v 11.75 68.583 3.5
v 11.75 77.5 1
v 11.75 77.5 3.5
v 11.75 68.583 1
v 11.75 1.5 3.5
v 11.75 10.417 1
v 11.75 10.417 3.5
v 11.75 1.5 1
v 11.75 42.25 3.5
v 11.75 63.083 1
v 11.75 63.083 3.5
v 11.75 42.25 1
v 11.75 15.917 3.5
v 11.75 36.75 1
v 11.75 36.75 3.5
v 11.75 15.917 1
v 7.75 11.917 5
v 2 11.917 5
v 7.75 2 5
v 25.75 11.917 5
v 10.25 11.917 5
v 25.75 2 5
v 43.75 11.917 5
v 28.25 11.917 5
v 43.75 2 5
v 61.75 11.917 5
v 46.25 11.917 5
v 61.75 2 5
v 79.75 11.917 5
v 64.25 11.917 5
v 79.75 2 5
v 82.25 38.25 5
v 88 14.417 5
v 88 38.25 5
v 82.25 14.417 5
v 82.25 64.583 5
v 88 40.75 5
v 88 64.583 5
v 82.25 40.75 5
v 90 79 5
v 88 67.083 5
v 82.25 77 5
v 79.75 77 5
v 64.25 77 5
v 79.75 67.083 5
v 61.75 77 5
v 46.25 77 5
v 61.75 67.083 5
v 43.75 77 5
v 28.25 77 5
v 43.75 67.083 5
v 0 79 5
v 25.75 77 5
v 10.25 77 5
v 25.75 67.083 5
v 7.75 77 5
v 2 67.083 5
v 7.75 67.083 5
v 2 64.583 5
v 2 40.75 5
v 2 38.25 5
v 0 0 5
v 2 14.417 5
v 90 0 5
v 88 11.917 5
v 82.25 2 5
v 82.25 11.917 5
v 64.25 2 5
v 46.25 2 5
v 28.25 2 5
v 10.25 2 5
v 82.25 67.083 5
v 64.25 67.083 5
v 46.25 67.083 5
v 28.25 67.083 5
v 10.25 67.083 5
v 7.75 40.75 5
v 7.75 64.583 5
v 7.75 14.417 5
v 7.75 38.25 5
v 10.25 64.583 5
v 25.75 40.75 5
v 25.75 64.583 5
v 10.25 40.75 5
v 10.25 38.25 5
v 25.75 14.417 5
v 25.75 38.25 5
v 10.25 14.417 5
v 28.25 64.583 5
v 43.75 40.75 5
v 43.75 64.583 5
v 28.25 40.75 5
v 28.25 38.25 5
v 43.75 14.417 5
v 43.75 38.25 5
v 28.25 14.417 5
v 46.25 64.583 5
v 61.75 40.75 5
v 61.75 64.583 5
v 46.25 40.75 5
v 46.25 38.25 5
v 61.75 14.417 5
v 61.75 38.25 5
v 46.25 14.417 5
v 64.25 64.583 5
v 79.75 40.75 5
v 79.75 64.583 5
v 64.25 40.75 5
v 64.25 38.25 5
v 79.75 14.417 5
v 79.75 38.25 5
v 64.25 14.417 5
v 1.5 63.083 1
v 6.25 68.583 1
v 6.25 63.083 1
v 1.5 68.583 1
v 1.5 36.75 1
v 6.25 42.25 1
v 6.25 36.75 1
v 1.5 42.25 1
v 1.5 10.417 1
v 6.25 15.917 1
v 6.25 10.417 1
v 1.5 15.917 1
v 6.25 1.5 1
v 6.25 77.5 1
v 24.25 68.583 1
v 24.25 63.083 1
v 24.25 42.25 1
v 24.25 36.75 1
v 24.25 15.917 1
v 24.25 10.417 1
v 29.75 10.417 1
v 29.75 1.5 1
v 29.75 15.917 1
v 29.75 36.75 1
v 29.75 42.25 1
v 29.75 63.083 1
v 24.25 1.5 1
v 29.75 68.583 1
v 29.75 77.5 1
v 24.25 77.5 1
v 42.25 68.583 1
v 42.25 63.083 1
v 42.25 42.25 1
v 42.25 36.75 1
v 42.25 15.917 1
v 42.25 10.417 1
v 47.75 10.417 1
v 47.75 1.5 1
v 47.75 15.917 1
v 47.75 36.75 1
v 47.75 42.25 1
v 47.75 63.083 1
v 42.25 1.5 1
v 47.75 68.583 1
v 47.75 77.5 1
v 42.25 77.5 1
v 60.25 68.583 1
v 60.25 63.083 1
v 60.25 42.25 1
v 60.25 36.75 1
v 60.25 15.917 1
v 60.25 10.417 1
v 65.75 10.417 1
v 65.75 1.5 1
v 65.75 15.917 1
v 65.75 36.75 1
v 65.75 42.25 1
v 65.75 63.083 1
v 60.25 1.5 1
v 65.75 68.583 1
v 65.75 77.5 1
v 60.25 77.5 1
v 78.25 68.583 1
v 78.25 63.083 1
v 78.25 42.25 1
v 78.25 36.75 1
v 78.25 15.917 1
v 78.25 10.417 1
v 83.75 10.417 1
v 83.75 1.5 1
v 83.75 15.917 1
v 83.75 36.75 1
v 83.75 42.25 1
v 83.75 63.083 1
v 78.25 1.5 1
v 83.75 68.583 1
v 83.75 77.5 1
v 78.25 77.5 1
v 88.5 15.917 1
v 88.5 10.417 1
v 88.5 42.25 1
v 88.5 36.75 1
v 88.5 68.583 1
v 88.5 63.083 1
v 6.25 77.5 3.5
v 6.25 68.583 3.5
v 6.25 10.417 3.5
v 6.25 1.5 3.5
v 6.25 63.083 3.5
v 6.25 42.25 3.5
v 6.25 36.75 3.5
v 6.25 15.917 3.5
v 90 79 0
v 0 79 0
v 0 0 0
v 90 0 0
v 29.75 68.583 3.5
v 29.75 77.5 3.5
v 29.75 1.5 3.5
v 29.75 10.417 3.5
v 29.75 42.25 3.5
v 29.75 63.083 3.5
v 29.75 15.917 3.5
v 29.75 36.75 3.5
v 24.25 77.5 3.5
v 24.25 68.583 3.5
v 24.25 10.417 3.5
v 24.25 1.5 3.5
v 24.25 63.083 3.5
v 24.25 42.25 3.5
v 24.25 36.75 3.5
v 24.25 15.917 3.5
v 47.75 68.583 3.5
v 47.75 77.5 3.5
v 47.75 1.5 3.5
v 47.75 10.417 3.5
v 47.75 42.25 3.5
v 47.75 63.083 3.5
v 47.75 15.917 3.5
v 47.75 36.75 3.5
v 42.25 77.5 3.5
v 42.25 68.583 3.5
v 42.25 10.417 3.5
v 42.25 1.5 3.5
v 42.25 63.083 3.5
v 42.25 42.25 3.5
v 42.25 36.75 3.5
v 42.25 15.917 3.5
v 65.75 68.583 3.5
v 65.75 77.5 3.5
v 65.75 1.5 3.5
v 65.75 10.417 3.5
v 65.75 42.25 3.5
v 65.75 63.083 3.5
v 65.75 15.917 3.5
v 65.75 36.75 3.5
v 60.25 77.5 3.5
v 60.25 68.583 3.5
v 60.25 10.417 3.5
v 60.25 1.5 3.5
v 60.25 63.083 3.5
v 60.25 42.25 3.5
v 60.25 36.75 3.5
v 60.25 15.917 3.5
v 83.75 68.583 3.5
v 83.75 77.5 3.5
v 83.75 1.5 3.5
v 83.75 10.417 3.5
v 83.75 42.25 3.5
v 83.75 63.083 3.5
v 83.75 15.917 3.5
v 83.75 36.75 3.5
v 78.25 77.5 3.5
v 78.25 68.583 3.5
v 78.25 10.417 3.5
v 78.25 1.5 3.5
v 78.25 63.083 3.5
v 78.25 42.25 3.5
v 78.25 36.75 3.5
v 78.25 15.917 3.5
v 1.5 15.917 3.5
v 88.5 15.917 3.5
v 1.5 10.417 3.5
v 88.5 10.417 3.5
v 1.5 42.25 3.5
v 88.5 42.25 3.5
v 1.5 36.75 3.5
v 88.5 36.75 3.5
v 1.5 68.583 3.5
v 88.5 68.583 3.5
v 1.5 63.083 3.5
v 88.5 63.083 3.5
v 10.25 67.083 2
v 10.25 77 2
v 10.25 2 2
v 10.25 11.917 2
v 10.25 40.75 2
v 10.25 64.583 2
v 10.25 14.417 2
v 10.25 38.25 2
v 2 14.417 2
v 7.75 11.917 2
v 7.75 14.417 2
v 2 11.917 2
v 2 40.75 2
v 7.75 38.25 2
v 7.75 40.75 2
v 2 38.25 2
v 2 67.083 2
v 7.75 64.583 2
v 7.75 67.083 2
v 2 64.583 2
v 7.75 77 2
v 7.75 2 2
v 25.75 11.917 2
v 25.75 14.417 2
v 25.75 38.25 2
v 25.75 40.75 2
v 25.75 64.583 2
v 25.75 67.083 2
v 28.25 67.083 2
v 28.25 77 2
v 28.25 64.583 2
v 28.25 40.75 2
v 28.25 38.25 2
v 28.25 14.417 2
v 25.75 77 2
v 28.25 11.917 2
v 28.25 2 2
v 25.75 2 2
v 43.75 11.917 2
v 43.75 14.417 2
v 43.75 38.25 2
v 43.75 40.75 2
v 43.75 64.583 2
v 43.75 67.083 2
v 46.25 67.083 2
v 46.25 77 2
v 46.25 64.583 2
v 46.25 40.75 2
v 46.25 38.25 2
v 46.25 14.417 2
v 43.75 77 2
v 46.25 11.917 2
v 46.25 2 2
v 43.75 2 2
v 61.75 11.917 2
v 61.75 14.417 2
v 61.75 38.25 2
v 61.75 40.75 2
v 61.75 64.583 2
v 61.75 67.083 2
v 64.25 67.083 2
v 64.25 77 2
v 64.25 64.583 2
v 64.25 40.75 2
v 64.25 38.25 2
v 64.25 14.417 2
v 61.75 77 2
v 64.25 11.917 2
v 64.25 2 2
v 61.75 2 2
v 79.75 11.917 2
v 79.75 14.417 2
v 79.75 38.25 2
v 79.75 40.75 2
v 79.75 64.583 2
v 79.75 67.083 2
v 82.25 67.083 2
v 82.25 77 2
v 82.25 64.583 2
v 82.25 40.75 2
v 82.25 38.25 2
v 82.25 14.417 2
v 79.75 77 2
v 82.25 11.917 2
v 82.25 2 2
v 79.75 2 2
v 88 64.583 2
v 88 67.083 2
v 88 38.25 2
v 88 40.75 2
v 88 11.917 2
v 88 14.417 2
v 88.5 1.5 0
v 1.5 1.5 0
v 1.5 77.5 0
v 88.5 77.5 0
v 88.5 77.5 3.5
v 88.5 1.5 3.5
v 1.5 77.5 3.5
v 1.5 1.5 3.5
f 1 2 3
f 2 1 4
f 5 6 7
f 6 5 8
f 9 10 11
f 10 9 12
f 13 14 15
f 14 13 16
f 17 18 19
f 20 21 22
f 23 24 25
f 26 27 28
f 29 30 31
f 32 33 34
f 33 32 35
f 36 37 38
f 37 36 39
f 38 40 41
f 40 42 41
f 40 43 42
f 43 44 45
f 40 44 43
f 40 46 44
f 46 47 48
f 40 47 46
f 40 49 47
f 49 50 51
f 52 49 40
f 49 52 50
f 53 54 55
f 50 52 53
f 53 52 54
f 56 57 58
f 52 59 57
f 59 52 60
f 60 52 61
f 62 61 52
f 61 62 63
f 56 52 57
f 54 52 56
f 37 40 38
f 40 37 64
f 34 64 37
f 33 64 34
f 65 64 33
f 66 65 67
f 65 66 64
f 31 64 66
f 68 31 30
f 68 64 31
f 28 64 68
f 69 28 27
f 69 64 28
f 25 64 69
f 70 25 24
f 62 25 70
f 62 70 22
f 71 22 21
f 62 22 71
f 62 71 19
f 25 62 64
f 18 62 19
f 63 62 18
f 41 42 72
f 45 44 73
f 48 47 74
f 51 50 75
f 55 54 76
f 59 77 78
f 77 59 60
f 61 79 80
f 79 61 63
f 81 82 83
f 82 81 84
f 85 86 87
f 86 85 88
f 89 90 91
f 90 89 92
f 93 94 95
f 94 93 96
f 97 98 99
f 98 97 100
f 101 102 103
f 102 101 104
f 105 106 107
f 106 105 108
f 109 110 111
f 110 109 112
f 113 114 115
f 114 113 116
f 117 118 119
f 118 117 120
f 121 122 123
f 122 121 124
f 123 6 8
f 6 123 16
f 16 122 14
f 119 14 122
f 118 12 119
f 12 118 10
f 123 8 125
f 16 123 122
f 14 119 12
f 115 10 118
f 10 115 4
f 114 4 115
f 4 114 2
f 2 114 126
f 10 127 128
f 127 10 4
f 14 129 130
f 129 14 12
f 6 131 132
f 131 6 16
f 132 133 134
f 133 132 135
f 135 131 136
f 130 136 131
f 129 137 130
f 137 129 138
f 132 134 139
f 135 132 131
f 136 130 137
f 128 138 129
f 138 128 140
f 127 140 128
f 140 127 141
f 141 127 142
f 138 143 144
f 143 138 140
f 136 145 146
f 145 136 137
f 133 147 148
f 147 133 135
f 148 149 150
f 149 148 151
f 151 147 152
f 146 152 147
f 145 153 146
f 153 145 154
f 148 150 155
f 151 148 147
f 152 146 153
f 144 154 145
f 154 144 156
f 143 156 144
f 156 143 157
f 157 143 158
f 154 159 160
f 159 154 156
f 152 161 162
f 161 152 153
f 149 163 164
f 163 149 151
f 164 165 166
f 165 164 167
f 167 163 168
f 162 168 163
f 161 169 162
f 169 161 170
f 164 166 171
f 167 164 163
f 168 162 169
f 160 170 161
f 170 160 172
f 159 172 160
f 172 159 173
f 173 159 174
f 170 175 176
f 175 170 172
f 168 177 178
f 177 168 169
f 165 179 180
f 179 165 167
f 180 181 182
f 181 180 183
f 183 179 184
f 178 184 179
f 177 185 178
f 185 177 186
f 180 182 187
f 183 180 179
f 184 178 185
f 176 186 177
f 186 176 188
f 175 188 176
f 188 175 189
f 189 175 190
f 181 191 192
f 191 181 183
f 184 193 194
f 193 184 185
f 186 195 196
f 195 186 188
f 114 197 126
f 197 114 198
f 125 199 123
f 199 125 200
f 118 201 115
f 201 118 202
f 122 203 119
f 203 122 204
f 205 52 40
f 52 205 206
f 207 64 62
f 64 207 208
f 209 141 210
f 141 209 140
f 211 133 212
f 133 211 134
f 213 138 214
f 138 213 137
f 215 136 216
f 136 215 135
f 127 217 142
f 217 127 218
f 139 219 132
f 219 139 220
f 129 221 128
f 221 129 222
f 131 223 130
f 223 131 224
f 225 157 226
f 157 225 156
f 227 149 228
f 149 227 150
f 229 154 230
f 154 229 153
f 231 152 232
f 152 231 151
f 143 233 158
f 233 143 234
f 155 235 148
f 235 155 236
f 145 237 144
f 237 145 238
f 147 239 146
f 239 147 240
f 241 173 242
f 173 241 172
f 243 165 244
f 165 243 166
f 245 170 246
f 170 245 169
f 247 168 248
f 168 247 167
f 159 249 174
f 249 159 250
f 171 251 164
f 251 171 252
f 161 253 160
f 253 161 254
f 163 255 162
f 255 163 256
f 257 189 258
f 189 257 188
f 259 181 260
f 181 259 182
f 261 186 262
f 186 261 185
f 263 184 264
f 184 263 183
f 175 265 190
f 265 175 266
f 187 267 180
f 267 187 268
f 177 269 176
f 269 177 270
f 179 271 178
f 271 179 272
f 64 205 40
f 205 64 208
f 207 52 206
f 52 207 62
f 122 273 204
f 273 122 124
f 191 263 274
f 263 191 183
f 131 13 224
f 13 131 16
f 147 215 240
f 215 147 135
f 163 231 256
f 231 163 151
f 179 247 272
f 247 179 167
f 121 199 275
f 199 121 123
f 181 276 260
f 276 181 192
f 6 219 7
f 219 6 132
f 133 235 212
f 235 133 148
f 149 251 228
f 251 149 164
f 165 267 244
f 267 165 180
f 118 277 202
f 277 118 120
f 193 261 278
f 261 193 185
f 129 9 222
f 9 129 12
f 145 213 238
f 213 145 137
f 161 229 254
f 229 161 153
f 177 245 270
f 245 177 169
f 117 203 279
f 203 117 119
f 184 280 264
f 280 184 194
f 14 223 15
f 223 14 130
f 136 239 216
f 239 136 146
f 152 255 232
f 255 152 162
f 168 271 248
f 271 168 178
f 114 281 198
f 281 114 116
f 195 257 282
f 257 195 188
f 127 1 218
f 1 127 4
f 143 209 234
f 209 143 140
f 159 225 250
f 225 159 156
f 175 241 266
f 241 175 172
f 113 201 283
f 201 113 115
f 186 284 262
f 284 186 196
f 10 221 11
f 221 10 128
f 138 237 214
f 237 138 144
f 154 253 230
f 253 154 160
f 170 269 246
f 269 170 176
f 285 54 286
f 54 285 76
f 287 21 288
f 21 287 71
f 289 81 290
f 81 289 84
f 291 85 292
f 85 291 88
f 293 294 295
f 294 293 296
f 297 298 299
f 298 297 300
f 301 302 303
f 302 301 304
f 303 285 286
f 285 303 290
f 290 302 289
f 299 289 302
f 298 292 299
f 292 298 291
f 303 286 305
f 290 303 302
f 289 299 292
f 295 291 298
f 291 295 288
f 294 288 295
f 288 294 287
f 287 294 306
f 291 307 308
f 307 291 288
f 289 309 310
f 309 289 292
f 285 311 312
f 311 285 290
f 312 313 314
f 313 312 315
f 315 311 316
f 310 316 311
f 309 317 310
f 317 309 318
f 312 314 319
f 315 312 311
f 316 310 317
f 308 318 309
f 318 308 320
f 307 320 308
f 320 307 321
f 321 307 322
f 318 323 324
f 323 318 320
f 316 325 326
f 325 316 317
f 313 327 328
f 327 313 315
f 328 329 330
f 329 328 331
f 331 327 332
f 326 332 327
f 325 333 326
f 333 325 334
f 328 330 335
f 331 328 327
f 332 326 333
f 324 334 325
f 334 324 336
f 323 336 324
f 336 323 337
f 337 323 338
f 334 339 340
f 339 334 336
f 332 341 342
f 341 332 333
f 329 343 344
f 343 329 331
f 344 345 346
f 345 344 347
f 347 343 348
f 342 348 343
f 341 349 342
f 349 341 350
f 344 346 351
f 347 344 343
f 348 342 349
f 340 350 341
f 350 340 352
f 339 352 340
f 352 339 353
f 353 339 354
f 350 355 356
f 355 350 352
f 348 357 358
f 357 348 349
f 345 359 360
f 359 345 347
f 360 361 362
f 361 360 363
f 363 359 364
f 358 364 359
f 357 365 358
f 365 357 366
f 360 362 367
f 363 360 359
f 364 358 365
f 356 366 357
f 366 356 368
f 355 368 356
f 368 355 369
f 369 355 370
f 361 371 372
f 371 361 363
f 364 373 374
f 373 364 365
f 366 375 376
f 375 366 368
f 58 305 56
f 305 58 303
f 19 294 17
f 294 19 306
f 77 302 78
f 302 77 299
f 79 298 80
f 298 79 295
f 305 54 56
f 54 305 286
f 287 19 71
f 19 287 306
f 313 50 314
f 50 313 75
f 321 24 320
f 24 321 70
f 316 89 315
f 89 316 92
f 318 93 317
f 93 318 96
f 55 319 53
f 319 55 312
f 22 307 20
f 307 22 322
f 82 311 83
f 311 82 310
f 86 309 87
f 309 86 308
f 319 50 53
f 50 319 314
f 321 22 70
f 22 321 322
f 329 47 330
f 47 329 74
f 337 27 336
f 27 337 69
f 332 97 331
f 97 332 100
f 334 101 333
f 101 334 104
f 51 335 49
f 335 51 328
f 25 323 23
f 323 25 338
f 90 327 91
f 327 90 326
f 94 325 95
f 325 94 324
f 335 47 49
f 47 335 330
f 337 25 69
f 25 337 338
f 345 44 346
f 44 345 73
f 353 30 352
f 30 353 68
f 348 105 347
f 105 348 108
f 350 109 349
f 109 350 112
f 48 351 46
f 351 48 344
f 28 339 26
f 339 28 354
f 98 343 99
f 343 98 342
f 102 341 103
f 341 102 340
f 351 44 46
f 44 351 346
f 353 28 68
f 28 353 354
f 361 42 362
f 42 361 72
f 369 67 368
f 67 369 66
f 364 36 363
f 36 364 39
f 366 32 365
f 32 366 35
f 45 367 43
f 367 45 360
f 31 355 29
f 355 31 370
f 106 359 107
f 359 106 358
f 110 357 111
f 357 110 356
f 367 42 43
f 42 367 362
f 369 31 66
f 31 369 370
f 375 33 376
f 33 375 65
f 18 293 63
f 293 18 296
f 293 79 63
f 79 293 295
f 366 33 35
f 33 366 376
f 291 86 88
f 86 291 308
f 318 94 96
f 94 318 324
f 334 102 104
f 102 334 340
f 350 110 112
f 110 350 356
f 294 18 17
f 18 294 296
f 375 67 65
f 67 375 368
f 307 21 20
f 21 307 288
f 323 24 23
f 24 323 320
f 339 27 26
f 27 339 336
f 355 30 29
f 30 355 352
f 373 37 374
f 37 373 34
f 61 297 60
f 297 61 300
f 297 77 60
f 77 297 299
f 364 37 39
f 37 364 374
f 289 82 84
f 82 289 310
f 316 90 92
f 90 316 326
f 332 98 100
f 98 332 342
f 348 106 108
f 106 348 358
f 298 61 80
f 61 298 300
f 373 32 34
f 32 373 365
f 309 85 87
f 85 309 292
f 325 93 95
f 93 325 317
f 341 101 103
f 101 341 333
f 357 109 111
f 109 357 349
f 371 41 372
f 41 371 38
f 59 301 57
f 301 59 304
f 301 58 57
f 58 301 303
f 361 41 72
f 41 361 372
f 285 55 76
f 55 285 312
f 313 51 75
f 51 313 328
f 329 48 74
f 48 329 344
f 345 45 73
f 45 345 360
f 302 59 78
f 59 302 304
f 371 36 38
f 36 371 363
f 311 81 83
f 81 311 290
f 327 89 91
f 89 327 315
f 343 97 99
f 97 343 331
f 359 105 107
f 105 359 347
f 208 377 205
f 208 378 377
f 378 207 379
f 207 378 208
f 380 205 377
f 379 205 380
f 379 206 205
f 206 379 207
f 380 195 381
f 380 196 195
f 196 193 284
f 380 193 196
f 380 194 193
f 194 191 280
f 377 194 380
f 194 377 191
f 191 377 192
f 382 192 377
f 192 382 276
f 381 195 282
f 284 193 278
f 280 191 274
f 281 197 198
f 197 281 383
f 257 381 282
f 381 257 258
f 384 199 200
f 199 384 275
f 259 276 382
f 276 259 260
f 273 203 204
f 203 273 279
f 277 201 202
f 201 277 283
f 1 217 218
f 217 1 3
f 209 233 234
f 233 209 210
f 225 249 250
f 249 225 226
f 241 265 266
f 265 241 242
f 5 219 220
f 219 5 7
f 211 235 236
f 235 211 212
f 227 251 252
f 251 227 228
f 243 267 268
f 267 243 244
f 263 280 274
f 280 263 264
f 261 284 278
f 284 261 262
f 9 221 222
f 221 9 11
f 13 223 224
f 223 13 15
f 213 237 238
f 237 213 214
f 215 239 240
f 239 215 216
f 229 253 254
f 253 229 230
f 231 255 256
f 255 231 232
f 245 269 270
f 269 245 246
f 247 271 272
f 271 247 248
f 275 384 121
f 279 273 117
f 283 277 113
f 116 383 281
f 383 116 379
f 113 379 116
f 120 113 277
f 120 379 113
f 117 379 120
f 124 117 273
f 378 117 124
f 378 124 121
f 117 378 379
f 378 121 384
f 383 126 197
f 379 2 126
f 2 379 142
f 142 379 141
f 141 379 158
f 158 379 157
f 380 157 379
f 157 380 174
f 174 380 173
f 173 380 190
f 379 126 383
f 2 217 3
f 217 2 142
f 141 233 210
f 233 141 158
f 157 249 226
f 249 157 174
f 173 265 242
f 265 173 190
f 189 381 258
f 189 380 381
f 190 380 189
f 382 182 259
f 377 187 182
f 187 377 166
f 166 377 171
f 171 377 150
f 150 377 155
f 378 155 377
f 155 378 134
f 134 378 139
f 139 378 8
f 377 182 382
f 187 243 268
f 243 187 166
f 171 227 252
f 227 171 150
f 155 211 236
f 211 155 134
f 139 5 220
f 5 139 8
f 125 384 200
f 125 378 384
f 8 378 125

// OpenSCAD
// Horizontal size of the base
baseWidth = 90; // [10:500]
// Vertical size of the base
baseHeight = 79; // [10:500]
// Thickness of the base
baseThickness = 5; // [1:50]

// How wide the gap of the grooves is
grooveWidth = 2.5; // [0.1:0.1:5]
// How deep into the base the grooves are cut
grooveDepth = 3; // [0.1:0.1:5]

// How many grooves to cut across the horizontal dimension
horizontalGrooveCount = 5; // [0:10]
// How many gooves to cut across the vertical dimension
verticalGrooveCount = 3; // [0:10]
// How far before the edge of the base should the grooves stop?
marginSize = 2; // [-1:0.1:10]

union() {
    difference() {
        translate([0,0,baseThickness-grooveDepth-1]) Grooves(grooveWidth+3, grooveDepth+1, 0);
        translate([0,0,baseThickness-grooveDepth]) Grooves(grooveWidth, baseThickness+2, marginSize);
    }
    difference() {
        cube([baseWidth, baseHeight, baseThickness]);
        translate([0, 0, baseThickness-grooveDepth]) Grooves(grooveWidth, baseThickness+2, marginSize);
        translate([1.5, 1.5, -1]) cube([baseWidth-3, baseHeight-3, baseThickness-0.5]);
    }
}


module Grooves(grooveWidth, grooveDepth, marginSize) {
    translate([baseWidth/horizontalGrooveCount/2-grooveWidth/2, 0, 0]) {
        for (a = [0 : horizontalGrooveCount-1]) {
            translate([(baseWidth/horizontalGrooveCount)*a, marginSize, 0]) cube([grooveWidth, baseHeight-marginSize*2, grooveDepth]);
        }
    }
    translate([0, baseHeight/verticalGrooveCount/2-grooveWidth/2, 0]) {
        for (a = [0 : verticalGrooveCount-1]) {
            translate([marginSize, (baseHeight/verticalGrooveCount)*a, 0]) cube([baseWidth-marginSize*2, grooveWidth, grooveDepth]);
        }
    }
}
